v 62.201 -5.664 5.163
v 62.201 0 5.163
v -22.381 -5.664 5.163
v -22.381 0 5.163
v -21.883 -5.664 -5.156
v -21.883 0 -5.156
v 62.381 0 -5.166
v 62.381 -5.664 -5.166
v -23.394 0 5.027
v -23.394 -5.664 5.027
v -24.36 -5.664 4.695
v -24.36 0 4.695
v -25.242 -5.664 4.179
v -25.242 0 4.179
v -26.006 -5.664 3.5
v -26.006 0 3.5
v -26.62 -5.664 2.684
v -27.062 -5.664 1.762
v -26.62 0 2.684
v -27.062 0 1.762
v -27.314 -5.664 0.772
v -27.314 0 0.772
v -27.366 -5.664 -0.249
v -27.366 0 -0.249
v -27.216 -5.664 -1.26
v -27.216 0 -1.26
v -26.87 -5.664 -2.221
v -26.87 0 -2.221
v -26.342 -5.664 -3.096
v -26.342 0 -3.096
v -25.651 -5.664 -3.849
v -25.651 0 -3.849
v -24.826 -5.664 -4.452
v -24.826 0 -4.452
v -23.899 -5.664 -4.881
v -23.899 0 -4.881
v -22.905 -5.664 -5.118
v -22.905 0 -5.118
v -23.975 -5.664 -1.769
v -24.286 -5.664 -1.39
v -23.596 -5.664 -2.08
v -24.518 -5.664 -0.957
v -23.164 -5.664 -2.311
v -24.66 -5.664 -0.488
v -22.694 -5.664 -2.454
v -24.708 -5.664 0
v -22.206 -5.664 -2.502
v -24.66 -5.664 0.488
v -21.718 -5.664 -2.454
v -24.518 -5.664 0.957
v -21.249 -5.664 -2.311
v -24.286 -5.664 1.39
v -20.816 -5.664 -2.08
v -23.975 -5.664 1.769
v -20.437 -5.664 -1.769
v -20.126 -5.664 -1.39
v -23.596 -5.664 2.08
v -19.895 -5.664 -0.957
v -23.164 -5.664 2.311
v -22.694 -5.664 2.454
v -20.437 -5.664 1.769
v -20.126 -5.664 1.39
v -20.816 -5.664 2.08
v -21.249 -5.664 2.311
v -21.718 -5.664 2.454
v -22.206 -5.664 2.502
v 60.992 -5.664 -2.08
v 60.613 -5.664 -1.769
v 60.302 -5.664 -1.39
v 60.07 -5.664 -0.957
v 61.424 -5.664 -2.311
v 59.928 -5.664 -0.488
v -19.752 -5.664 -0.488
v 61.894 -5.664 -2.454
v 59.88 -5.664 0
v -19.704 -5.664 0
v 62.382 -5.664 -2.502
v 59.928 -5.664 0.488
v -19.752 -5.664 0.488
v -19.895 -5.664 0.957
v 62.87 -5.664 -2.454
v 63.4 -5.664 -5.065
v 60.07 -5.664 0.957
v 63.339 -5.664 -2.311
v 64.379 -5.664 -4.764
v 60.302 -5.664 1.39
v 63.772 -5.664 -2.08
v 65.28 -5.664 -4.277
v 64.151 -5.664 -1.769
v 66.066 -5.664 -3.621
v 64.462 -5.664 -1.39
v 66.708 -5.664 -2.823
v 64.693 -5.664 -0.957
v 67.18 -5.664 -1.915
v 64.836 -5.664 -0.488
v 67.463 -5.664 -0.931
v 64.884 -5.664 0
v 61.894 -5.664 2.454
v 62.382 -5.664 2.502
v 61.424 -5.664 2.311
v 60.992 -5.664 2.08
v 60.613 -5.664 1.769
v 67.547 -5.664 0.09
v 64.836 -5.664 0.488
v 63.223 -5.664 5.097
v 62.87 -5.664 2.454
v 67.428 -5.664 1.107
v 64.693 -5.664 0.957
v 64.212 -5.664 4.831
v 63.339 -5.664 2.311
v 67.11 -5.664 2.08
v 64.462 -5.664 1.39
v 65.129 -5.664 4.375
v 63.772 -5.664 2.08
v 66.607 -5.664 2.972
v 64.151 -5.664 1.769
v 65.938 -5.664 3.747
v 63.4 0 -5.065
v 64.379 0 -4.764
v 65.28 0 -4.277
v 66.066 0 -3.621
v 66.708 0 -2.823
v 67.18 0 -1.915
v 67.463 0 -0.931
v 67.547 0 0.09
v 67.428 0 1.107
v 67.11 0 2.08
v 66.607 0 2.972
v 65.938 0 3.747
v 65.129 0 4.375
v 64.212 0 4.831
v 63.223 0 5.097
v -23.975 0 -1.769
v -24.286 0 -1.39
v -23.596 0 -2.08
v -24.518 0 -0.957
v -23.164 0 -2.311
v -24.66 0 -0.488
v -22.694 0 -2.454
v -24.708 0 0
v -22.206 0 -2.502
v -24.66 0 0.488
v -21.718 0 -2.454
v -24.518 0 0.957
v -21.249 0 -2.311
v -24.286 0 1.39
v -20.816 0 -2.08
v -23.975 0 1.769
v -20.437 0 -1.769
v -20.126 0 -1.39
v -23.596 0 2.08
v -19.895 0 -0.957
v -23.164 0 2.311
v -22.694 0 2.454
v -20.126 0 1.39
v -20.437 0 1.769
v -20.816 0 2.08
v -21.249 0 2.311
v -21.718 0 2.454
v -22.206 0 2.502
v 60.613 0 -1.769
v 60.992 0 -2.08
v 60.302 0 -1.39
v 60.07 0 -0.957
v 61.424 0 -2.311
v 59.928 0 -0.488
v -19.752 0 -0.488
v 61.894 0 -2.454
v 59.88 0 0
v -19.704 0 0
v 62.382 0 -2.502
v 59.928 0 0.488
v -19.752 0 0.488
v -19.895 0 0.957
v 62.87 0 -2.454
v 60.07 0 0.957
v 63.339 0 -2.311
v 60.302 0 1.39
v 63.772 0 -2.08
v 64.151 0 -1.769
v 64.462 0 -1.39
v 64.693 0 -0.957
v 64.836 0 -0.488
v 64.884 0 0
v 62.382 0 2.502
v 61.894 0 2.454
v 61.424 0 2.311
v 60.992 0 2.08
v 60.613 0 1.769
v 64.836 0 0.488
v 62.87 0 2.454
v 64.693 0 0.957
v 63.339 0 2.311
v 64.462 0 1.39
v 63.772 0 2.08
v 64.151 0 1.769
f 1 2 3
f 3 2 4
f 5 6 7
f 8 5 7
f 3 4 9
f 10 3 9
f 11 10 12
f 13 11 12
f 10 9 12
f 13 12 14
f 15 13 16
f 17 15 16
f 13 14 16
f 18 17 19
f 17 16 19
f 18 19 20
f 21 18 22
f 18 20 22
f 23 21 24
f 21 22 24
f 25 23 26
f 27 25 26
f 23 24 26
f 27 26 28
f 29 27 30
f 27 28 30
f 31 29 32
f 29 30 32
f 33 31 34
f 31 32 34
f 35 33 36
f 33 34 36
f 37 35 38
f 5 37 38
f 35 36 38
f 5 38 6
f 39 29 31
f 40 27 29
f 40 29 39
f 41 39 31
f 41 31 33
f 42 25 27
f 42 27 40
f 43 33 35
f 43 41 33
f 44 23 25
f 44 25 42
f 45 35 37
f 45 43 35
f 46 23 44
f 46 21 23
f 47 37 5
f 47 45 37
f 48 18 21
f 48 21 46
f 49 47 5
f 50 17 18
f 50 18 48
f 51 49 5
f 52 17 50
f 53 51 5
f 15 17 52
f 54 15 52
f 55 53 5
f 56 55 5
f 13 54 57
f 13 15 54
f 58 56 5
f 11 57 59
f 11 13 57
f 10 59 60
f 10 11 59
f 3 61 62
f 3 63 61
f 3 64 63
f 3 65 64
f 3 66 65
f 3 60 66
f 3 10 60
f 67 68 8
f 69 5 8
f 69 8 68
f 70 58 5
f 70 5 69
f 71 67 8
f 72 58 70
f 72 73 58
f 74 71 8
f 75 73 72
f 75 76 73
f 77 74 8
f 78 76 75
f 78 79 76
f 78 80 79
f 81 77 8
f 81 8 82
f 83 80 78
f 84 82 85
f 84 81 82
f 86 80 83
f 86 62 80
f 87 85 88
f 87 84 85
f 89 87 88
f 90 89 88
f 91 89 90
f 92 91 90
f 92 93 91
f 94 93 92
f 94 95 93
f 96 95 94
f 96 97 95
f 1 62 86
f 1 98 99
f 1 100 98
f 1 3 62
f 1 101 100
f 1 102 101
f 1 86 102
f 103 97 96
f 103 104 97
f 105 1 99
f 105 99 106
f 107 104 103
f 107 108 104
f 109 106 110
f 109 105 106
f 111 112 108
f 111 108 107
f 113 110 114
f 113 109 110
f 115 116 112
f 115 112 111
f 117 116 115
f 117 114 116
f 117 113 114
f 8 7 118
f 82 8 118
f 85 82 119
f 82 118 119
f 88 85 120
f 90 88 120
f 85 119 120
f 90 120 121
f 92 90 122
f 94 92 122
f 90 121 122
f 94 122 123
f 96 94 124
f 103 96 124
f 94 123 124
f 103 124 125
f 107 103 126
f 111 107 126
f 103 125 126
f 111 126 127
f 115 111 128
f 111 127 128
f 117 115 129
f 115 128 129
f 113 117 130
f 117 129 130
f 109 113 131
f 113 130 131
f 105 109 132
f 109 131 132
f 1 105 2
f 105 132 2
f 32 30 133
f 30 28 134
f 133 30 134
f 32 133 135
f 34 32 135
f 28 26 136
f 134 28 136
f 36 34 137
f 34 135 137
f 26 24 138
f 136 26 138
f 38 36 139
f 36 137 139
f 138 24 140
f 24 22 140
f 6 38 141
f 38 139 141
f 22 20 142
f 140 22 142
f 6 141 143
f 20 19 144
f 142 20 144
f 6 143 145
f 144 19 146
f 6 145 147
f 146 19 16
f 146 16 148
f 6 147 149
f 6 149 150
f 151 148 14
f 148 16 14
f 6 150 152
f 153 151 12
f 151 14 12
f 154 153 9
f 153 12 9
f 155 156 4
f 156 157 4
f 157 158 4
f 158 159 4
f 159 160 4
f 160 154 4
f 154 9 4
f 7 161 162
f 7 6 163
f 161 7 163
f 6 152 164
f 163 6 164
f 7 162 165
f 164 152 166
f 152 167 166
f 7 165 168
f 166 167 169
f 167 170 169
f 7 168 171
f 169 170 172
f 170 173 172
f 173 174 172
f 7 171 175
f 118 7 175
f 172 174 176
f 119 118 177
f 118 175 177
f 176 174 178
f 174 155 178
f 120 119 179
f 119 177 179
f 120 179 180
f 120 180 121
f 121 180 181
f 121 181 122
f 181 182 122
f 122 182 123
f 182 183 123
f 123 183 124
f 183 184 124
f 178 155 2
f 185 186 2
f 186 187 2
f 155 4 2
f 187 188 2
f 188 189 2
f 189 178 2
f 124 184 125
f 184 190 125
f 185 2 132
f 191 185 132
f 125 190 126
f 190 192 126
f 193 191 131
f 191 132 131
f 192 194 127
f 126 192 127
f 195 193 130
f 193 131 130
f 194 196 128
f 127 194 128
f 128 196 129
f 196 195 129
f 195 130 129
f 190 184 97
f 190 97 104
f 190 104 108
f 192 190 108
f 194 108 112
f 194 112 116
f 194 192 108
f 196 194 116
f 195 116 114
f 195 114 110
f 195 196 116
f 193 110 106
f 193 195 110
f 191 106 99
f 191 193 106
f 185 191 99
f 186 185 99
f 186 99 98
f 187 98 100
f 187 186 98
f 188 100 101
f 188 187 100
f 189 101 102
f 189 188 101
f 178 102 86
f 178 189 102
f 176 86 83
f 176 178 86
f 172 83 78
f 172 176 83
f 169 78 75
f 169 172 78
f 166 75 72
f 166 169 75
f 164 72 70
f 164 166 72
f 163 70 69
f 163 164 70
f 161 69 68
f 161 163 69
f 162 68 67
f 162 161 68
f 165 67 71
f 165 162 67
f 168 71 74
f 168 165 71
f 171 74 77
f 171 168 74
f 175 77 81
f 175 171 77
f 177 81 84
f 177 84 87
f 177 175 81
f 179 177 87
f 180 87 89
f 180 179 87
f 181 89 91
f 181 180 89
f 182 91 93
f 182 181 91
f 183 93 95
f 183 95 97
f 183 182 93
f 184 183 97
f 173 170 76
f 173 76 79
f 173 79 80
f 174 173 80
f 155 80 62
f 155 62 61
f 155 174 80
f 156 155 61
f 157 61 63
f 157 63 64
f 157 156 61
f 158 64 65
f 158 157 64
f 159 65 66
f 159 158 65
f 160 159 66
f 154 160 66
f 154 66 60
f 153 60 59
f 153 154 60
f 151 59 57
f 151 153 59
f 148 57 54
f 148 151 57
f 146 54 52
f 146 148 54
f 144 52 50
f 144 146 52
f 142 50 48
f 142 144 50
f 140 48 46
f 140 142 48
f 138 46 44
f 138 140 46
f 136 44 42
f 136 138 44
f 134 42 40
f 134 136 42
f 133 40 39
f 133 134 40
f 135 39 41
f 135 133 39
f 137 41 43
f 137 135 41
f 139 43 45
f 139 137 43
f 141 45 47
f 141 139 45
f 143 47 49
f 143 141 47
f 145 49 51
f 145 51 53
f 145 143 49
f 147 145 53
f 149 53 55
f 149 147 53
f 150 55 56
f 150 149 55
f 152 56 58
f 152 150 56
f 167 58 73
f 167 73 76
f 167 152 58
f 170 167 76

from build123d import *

# Parameters (mm, degrees)
F0_R     = 2.5019
F1_DEPTH = 5.6642


with BuildPart() as f1:
    # F0 (on Front) → F1 (new body)
    with BuildSketch(Plane.XZ):
        with BuildLine():
            Line((62.201412, 5.162847), (-22.03138, 5.162847))
            Line((-22.03138, 5.162847), (-22.38087, 5.162847))
            ThreePointArc((-22.38087, 5.162847), (-27.365937, -0.248725), (-21.883471, -5.155717))
            Line((-21.883471, -5.155717), (62.381241, -5.166))
            ThreePointArc((62.381241, -5.166), (67.547089, 0.089928), (62.201412, 5.162847))
        make_face()
        with Locations((-22.206125, 0)):
            Circle(F0_R, mode=Mode.SUBTRACT)
        with Locations((62.381871, 0)):
            Circle(F0_R, mode=Mode.SUBTRACT)
    extrude(amount=F1_DEPTH)


solid = f1.part
